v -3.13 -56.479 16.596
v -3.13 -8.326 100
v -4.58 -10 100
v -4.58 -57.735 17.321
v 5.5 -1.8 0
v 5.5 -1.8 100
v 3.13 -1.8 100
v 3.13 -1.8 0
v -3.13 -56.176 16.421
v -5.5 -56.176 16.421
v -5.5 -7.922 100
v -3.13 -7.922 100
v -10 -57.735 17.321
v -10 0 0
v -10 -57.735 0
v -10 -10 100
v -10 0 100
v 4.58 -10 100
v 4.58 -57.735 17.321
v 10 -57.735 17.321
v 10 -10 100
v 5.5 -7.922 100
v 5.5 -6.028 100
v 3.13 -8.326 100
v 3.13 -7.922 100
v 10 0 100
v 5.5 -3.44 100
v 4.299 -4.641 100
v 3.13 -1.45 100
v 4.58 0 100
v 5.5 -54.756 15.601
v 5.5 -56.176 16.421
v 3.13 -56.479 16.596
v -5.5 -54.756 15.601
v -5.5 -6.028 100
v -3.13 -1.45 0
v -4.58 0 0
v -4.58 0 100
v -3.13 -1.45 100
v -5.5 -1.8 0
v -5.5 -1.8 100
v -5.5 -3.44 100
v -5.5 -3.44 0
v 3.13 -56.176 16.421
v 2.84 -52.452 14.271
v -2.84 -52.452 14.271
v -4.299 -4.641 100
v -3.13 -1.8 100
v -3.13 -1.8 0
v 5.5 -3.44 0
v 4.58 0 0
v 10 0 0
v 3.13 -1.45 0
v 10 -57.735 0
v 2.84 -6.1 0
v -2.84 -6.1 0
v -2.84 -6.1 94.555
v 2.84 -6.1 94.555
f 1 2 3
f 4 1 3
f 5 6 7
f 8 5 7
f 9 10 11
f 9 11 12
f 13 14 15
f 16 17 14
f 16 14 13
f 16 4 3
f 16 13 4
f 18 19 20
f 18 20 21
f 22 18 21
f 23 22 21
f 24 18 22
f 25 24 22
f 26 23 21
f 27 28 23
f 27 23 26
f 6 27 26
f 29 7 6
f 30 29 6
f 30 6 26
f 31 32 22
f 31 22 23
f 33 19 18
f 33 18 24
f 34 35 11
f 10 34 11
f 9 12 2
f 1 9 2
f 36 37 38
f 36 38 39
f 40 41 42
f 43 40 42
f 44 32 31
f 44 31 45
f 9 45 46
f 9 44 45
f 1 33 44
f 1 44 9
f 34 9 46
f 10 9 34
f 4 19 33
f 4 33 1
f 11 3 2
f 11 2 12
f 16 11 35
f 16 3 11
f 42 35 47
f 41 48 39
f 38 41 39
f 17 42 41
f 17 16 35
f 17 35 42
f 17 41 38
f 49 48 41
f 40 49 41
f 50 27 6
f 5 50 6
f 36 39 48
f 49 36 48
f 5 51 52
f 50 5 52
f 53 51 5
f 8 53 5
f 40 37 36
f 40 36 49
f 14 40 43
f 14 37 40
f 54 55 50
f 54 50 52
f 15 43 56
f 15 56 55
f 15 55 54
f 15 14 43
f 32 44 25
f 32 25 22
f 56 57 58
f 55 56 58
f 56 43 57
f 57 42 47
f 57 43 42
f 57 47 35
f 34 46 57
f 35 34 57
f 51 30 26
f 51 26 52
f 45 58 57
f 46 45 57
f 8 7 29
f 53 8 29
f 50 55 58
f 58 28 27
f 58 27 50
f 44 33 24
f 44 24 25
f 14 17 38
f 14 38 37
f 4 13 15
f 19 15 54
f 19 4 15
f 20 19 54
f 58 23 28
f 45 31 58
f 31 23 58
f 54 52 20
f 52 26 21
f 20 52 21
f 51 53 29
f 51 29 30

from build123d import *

# Parameters (mm, degrees)
PROFILE_START                   = -10
PROFILE_EXTRUDE_DEPTH           = 20
TOP_T_NUT_SLOT_CUT_DEPTH        = 122.194199002
FRONT_EDGE_CHAMFER_SIZE         = 10
FRONT_EDGE_CHAMFER_SIZE2        = 20
FRONT_T_NUT_SLOT_CUT_DEPTH      = 127.560696268
FRONT_T_NUT_SLOT_CUT_DEPTH_BACK = 95.470054


with BuildPart() as part:
    # Profile Sketch → Profile Extrude (new body)
    with BuildSketch(Plane(origin=(0, -25.324194998, 100.875319125), x_dir=(0, 1, 0), z_dir=(1, 0, 0)).offset(PROFILE_START)):
        Polygon((-42.410831921, -100.875319125), (15.324194998, -0.875319125), (25.324194998, -0.875319125), (25.324194998, -100.875319125), align=None)
    extrude(amount=PROFILE_EXTRUDE_DEPTH)

    # Top T-Nut Slot Sketch → Top T-Nut Slot Cut (cut, through all)
    with BuildSketch(Plane.XY.offset(100)):
        Polygon((-4.58, 0), (-3.13, -1.45), (-3.13, -1.8), (-5.5, -1.8), (-5.5, -3.44), (-2.84, -6.1), (2.84, -6.1), (5.5, -3.44), (5.5, -1.8), (3.13, -1.8), (3.13, -1.45), (4.58, 0), align=None)
    extrude(amount=-TOP_T_NUT_SLOT_CUT_DEPTH, mode=Mode.SUBTRACT)

    # Front Edge Chamfer
    front_edge_chamfer_edges = [part.edges().sort_by_distance(p)[0] for p in [
        (0, -67.735026919, 0),
    ]]
    front_edge_chamfer_side = [part.faces().sort_by_distance(p)[0] for p in [
        (0, -35.138756164, 0),
    ]]
    chamfer(front_edge_chamfer_edges, length=FRONT_EDGE_CHAMFER_SIZE, length2=FRONT_EDGE_CHAMFER_SIZE2, reference=front_edge_chamfer_side[0])

    # Front T-Nut Slot Sketch → Front T-Nut Slot Cut (cut, two sides: drawn at the far end of the back side and taken through both)
    with BuildSketch(Plane(origin=(20, 44.249147411, 68.679240139), x_dir=(-1, 0, 0), z_dir=(0, 0.5000000000000038, 0.8660254037844364)).offset(-FRONT_T_NUT_SLOT_CUT_DEPTH_BACK)):
        Polygon((15.42, 62.641519722), (16.87, 61.191519722), (16.87, 60.841519722), (14.5, 60.841519722), (14.5, 59.201519722), (17.16, 56.541519722), (22.84, 56.541519722), (25.5, 59.201519722), (25.5, 60.841519722), (23.13, 60.841519722), (23.13, 61.191519722), (24.58, 62.641519722), align=None)
    extrude(amount=FRONT_T_NUT_SLOT_CUT_DEPTH + FRONT_T_NUT_SLOT_CUT_DEPTH_BACK, mode=Mode.SUBTRACT)


solid = part.part
